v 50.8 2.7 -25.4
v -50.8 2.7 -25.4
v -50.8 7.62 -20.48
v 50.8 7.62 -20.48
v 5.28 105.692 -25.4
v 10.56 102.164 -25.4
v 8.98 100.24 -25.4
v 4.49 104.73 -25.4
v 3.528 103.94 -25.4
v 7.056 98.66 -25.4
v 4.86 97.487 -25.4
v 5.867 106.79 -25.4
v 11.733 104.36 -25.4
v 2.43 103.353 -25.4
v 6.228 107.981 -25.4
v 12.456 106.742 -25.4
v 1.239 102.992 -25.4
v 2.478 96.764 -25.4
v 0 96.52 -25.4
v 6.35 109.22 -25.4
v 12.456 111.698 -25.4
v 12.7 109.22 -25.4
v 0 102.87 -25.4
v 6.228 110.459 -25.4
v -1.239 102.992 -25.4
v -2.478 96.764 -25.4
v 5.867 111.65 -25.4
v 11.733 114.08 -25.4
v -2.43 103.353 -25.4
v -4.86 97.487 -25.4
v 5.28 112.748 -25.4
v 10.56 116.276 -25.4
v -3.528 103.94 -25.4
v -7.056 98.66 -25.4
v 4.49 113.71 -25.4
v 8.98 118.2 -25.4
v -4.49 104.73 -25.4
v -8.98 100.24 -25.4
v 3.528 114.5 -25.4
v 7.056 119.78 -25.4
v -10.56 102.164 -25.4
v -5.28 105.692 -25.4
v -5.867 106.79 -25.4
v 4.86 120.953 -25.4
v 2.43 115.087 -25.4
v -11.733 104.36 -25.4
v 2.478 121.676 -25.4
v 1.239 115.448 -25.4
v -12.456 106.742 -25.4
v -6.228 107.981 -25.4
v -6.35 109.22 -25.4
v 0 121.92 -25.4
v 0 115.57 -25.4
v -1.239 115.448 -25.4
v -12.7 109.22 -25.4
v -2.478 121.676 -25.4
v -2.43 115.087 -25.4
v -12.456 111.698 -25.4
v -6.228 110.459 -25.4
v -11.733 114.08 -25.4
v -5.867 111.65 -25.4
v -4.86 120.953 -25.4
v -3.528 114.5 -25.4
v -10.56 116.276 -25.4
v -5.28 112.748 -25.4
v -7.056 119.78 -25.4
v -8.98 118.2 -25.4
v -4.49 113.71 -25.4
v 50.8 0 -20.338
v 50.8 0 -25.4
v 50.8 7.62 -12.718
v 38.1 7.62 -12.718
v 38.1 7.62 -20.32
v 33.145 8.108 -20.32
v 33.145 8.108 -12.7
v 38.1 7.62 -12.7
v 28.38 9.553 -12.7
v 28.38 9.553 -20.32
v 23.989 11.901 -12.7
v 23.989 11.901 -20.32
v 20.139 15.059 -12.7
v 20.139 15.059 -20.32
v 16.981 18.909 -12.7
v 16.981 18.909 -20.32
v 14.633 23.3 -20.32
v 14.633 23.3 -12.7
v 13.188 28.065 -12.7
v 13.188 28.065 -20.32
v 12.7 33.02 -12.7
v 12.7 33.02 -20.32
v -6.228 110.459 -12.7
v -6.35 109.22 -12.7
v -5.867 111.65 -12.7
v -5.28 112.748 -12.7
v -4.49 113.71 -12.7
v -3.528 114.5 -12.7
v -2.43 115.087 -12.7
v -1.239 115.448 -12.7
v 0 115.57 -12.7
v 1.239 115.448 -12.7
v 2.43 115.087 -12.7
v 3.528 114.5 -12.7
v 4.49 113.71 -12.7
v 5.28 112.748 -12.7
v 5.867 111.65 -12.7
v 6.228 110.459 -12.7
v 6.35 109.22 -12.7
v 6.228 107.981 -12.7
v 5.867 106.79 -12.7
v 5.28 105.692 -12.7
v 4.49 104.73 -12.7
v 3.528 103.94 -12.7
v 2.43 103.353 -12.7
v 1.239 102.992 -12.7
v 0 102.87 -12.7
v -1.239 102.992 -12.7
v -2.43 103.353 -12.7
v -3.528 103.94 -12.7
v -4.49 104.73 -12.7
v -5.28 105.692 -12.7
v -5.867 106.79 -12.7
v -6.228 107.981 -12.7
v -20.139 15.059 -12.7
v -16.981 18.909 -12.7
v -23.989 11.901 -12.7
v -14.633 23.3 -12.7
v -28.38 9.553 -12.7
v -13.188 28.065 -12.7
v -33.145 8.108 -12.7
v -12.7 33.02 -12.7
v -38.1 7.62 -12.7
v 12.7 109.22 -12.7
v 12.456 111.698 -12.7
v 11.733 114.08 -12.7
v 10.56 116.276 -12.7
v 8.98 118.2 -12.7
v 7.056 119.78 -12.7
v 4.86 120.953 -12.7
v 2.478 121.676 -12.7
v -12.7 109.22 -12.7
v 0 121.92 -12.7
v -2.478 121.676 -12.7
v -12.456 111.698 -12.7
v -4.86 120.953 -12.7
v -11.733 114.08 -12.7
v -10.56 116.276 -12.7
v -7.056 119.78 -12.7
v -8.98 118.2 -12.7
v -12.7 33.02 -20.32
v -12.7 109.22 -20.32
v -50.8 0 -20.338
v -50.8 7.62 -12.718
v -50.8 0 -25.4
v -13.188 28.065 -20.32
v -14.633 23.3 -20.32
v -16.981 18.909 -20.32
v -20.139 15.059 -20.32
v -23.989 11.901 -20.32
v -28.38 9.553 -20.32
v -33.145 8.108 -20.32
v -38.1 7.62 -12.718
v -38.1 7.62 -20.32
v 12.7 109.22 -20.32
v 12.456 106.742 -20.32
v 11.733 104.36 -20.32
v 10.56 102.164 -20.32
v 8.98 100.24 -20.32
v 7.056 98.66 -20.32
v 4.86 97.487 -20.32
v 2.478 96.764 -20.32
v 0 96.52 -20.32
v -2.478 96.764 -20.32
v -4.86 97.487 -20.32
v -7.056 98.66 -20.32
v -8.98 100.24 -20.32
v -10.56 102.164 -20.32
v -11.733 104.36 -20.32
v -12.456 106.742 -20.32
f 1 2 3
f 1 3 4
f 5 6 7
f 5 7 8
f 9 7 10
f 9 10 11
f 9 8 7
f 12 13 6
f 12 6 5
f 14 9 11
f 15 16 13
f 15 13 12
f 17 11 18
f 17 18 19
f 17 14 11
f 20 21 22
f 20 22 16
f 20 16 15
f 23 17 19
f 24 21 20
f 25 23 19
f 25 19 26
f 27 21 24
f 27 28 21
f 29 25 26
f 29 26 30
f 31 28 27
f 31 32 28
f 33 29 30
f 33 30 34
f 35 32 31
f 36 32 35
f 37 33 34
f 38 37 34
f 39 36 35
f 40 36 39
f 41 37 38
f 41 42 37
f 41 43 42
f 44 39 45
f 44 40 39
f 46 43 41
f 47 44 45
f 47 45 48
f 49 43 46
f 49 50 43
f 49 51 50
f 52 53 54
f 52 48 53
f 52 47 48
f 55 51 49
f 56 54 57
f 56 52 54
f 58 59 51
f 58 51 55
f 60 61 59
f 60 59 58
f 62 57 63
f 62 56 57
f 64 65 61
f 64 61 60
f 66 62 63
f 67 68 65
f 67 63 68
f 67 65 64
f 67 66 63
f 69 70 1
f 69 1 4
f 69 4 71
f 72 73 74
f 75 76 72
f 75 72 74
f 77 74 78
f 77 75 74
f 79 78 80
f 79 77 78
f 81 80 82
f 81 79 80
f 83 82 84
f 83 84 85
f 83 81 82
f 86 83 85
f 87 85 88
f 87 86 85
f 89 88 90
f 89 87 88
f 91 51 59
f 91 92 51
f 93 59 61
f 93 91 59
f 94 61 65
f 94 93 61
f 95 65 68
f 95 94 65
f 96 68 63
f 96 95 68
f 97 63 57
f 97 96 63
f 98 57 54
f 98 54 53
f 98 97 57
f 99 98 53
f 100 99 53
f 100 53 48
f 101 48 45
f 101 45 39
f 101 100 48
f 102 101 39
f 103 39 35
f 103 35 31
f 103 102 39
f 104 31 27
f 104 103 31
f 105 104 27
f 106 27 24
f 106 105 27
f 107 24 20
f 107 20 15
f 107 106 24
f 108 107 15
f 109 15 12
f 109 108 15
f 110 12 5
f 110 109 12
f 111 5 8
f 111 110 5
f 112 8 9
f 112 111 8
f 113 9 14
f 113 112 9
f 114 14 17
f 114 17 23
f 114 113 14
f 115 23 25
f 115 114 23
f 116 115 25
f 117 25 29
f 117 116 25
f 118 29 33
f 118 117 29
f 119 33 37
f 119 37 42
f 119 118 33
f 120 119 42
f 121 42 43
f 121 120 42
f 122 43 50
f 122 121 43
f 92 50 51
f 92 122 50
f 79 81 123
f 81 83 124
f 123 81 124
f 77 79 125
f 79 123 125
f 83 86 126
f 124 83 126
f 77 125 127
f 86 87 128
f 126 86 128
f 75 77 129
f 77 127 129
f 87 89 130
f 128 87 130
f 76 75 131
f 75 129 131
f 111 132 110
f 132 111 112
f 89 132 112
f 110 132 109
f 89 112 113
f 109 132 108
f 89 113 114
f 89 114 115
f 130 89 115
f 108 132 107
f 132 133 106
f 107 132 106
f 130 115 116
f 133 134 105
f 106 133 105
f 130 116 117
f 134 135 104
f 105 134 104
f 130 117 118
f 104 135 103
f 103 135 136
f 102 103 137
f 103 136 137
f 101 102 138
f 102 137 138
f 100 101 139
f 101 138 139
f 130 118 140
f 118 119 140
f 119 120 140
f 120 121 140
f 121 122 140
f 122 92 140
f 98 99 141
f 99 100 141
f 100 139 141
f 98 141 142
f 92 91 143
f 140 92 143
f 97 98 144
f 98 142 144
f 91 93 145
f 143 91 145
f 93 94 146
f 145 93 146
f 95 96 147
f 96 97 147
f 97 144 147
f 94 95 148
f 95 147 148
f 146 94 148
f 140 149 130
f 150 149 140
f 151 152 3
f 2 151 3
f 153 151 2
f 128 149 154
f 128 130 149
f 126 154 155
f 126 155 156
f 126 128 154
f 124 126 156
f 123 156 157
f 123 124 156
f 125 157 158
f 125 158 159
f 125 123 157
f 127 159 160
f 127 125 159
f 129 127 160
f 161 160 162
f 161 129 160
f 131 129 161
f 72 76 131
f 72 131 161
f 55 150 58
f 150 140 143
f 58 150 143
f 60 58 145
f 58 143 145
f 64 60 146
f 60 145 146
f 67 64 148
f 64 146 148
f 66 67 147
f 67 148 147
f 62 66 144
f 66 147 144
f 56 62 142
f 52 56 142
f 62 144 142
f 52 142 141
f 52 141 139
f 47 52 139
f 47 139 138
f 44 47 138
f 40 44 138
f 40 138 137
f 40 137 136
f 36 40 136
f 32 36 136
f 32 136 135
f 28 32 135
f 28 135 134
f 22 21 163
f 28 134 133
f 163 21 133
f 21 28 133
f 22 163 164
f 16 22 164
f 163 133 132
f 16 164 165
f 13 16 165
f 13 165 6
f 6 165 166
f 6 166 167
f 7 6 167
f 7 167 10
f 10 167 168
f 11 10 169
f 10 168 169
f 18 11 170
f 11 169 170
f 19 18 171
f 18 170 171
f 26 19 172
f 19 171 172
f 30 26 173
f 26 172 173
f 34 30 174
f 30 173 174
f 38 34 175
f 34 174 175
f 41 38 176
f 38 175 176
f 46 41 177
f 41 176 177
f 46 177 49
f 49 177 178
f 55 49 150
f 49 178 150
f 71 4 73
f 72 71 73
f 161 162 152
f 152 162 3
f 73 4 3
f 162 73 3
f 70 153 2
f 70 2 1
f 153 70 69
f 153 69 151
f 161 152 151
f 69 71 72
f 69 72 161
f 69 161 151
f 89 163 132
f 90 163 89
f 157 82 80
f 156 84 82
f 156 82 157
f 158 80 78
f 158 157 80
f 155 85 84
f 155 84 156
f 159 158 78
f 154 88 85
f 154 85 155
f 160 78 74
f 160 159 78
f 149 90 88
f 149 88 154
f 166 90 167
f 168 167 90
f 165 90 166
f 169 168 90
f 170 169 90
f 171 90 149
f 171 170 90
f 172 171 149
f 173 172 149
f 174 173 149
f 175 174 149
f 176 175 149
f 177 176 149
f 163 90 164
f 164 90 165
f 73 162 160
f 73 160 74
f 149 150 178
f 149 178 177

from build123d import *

# Parameters (mm, degrees)
SKETCH1_R           = 6.35
BOSS_EXTRUDE1_DEPTH = 7.62
BOSS_EXTRUDE2_START = -5.08
SKETCH4_R           = 6.35
BOSS_EXTRUDE2_DEPTH = 7.62
BOSS_EXTRUDE3_START = 0
SKETCH4_3_R         = 6.35
BOSS_EXTRUDE3_DEPTH = 5.08
FILLET1_R           = 25.4
CHAMFER1_SIZE       = 4.92
CUT_EXTRUDE1_DEPTH  = 161.724006919


with BuildPart() as part:
    # Sketch1 → Boss-Extrude1 (new body)
    with BuildSketch(Plane(origin=(0, 0, 0), x_dir=(1, 0, 0), z_dir=(0, 1, 0))):
        with BuildLine():
            Line((-50.8, 25.4), (50.8, 25.4))
            Line((50.8, 25.4), (50.8, 0))
            ThreePointArc((50.8, 0), (43.360512242, -17.960512242), (25.4, -25.4))
            Line((25.4, -25.4), (-25.4, -25.4))
            ThreePointArc((-25.4, -25.4), (-43.360512242, -17.960512242), (-50.8, 0))
            Line((-50.8, 0), (-50.8, 25.4))
        make_face()
        with Locations((-25.4, 0)):
            Circle(SKETCH1_R, mode=Mode.SUBTRACT)
        with Locations((25.4, 0)):
            Circle(SKETCH1_R, mode=Mode.SUBTRACT)
    extrude(amount=BOSS_EXTRUDE1_DEPTH)

    # Sketch4 → Boss-Extrude2 (add)
    with BuildSketch(Plane(origin=(0, 0, -25.4), x_dir=(-1, 0, 0), z_dir=(0, 0, -1)).offset(BOSS_EXTRUDE2_START)):
        with BuildLine():
            ThreePointArc((12.7, 109.22), (0, 121.92), (-12.7, 109.22))
            Line((-12.7, 109.22), (-12.7, 7.62))
            Line((-12.7, 7.62), (12.7, 7.62))
            Line((12.7, 7.62), (12.7, 109.22))
        make_face()
        with Locations((0, 109.22)):
            Circle(SKETCH4_R, mode=Mode.SUBTRACT)
    extrude(amount=-BOSS_EXTRUDE2_DEPTH)

    # Sketch4<3> → Boss-Extrude3 (add)
    with BuildSketch(Plane(origin=(0, 0, -25.4), x_dir=(-1, 0, 0), z_dir=(0, 0, -1)).offset(BOSS_EXTRUDE3_START)):
        with BuildLine():
            ThreePointArc((-12.7, 109.22), (0, 96.52), (12.7, 109.22))
            ThreePointArc((12.7, 109.22), (0, 121.92), (-12.7, 109.22))
        make_face()
        with Locations((0, 109.22)):
            Circle(SKETCH4_3_R, mode=Mode.SUBTRACT)
    extrude(amount=-BOSS_EXTRUDE3_DEPTH)

    # Fillet1
    fillet1_edges = [part.edges().sort_by_distance(p)[0] for p in [
        (-12.7, 7.62, -16.51),
        (12.7, 7.62, -16.51),
    ]]
    fillet(fillet1_edges, radius=FILLET1_R)

    # Chamfer1
    chamfer1_edges = [part.edges().sort_by_distance(p)[0] for p in [
        (0, 7.62, -25.4),
    ]]
    chamfer(chamfer1_edges, length=CHAMFER1_SIZE)

    # Sketch8 → Cut-Extrude1 (cut, through all)
    with BuildSketch(Plane(origin=(50.8, 0, 0), x_dir=(0, 0, -1), z_dir=(1, 0, 0))):
        Polygon((12.717540877, 7.62), (20.337540877, 0), (-26.584534345, 0), (-26.584534345, 7.62), align=None)
    extrude(amount=-CUT_EXTRUDE1_DEPTH, mode=Mode.SUBTRACT)


solid = part.part
